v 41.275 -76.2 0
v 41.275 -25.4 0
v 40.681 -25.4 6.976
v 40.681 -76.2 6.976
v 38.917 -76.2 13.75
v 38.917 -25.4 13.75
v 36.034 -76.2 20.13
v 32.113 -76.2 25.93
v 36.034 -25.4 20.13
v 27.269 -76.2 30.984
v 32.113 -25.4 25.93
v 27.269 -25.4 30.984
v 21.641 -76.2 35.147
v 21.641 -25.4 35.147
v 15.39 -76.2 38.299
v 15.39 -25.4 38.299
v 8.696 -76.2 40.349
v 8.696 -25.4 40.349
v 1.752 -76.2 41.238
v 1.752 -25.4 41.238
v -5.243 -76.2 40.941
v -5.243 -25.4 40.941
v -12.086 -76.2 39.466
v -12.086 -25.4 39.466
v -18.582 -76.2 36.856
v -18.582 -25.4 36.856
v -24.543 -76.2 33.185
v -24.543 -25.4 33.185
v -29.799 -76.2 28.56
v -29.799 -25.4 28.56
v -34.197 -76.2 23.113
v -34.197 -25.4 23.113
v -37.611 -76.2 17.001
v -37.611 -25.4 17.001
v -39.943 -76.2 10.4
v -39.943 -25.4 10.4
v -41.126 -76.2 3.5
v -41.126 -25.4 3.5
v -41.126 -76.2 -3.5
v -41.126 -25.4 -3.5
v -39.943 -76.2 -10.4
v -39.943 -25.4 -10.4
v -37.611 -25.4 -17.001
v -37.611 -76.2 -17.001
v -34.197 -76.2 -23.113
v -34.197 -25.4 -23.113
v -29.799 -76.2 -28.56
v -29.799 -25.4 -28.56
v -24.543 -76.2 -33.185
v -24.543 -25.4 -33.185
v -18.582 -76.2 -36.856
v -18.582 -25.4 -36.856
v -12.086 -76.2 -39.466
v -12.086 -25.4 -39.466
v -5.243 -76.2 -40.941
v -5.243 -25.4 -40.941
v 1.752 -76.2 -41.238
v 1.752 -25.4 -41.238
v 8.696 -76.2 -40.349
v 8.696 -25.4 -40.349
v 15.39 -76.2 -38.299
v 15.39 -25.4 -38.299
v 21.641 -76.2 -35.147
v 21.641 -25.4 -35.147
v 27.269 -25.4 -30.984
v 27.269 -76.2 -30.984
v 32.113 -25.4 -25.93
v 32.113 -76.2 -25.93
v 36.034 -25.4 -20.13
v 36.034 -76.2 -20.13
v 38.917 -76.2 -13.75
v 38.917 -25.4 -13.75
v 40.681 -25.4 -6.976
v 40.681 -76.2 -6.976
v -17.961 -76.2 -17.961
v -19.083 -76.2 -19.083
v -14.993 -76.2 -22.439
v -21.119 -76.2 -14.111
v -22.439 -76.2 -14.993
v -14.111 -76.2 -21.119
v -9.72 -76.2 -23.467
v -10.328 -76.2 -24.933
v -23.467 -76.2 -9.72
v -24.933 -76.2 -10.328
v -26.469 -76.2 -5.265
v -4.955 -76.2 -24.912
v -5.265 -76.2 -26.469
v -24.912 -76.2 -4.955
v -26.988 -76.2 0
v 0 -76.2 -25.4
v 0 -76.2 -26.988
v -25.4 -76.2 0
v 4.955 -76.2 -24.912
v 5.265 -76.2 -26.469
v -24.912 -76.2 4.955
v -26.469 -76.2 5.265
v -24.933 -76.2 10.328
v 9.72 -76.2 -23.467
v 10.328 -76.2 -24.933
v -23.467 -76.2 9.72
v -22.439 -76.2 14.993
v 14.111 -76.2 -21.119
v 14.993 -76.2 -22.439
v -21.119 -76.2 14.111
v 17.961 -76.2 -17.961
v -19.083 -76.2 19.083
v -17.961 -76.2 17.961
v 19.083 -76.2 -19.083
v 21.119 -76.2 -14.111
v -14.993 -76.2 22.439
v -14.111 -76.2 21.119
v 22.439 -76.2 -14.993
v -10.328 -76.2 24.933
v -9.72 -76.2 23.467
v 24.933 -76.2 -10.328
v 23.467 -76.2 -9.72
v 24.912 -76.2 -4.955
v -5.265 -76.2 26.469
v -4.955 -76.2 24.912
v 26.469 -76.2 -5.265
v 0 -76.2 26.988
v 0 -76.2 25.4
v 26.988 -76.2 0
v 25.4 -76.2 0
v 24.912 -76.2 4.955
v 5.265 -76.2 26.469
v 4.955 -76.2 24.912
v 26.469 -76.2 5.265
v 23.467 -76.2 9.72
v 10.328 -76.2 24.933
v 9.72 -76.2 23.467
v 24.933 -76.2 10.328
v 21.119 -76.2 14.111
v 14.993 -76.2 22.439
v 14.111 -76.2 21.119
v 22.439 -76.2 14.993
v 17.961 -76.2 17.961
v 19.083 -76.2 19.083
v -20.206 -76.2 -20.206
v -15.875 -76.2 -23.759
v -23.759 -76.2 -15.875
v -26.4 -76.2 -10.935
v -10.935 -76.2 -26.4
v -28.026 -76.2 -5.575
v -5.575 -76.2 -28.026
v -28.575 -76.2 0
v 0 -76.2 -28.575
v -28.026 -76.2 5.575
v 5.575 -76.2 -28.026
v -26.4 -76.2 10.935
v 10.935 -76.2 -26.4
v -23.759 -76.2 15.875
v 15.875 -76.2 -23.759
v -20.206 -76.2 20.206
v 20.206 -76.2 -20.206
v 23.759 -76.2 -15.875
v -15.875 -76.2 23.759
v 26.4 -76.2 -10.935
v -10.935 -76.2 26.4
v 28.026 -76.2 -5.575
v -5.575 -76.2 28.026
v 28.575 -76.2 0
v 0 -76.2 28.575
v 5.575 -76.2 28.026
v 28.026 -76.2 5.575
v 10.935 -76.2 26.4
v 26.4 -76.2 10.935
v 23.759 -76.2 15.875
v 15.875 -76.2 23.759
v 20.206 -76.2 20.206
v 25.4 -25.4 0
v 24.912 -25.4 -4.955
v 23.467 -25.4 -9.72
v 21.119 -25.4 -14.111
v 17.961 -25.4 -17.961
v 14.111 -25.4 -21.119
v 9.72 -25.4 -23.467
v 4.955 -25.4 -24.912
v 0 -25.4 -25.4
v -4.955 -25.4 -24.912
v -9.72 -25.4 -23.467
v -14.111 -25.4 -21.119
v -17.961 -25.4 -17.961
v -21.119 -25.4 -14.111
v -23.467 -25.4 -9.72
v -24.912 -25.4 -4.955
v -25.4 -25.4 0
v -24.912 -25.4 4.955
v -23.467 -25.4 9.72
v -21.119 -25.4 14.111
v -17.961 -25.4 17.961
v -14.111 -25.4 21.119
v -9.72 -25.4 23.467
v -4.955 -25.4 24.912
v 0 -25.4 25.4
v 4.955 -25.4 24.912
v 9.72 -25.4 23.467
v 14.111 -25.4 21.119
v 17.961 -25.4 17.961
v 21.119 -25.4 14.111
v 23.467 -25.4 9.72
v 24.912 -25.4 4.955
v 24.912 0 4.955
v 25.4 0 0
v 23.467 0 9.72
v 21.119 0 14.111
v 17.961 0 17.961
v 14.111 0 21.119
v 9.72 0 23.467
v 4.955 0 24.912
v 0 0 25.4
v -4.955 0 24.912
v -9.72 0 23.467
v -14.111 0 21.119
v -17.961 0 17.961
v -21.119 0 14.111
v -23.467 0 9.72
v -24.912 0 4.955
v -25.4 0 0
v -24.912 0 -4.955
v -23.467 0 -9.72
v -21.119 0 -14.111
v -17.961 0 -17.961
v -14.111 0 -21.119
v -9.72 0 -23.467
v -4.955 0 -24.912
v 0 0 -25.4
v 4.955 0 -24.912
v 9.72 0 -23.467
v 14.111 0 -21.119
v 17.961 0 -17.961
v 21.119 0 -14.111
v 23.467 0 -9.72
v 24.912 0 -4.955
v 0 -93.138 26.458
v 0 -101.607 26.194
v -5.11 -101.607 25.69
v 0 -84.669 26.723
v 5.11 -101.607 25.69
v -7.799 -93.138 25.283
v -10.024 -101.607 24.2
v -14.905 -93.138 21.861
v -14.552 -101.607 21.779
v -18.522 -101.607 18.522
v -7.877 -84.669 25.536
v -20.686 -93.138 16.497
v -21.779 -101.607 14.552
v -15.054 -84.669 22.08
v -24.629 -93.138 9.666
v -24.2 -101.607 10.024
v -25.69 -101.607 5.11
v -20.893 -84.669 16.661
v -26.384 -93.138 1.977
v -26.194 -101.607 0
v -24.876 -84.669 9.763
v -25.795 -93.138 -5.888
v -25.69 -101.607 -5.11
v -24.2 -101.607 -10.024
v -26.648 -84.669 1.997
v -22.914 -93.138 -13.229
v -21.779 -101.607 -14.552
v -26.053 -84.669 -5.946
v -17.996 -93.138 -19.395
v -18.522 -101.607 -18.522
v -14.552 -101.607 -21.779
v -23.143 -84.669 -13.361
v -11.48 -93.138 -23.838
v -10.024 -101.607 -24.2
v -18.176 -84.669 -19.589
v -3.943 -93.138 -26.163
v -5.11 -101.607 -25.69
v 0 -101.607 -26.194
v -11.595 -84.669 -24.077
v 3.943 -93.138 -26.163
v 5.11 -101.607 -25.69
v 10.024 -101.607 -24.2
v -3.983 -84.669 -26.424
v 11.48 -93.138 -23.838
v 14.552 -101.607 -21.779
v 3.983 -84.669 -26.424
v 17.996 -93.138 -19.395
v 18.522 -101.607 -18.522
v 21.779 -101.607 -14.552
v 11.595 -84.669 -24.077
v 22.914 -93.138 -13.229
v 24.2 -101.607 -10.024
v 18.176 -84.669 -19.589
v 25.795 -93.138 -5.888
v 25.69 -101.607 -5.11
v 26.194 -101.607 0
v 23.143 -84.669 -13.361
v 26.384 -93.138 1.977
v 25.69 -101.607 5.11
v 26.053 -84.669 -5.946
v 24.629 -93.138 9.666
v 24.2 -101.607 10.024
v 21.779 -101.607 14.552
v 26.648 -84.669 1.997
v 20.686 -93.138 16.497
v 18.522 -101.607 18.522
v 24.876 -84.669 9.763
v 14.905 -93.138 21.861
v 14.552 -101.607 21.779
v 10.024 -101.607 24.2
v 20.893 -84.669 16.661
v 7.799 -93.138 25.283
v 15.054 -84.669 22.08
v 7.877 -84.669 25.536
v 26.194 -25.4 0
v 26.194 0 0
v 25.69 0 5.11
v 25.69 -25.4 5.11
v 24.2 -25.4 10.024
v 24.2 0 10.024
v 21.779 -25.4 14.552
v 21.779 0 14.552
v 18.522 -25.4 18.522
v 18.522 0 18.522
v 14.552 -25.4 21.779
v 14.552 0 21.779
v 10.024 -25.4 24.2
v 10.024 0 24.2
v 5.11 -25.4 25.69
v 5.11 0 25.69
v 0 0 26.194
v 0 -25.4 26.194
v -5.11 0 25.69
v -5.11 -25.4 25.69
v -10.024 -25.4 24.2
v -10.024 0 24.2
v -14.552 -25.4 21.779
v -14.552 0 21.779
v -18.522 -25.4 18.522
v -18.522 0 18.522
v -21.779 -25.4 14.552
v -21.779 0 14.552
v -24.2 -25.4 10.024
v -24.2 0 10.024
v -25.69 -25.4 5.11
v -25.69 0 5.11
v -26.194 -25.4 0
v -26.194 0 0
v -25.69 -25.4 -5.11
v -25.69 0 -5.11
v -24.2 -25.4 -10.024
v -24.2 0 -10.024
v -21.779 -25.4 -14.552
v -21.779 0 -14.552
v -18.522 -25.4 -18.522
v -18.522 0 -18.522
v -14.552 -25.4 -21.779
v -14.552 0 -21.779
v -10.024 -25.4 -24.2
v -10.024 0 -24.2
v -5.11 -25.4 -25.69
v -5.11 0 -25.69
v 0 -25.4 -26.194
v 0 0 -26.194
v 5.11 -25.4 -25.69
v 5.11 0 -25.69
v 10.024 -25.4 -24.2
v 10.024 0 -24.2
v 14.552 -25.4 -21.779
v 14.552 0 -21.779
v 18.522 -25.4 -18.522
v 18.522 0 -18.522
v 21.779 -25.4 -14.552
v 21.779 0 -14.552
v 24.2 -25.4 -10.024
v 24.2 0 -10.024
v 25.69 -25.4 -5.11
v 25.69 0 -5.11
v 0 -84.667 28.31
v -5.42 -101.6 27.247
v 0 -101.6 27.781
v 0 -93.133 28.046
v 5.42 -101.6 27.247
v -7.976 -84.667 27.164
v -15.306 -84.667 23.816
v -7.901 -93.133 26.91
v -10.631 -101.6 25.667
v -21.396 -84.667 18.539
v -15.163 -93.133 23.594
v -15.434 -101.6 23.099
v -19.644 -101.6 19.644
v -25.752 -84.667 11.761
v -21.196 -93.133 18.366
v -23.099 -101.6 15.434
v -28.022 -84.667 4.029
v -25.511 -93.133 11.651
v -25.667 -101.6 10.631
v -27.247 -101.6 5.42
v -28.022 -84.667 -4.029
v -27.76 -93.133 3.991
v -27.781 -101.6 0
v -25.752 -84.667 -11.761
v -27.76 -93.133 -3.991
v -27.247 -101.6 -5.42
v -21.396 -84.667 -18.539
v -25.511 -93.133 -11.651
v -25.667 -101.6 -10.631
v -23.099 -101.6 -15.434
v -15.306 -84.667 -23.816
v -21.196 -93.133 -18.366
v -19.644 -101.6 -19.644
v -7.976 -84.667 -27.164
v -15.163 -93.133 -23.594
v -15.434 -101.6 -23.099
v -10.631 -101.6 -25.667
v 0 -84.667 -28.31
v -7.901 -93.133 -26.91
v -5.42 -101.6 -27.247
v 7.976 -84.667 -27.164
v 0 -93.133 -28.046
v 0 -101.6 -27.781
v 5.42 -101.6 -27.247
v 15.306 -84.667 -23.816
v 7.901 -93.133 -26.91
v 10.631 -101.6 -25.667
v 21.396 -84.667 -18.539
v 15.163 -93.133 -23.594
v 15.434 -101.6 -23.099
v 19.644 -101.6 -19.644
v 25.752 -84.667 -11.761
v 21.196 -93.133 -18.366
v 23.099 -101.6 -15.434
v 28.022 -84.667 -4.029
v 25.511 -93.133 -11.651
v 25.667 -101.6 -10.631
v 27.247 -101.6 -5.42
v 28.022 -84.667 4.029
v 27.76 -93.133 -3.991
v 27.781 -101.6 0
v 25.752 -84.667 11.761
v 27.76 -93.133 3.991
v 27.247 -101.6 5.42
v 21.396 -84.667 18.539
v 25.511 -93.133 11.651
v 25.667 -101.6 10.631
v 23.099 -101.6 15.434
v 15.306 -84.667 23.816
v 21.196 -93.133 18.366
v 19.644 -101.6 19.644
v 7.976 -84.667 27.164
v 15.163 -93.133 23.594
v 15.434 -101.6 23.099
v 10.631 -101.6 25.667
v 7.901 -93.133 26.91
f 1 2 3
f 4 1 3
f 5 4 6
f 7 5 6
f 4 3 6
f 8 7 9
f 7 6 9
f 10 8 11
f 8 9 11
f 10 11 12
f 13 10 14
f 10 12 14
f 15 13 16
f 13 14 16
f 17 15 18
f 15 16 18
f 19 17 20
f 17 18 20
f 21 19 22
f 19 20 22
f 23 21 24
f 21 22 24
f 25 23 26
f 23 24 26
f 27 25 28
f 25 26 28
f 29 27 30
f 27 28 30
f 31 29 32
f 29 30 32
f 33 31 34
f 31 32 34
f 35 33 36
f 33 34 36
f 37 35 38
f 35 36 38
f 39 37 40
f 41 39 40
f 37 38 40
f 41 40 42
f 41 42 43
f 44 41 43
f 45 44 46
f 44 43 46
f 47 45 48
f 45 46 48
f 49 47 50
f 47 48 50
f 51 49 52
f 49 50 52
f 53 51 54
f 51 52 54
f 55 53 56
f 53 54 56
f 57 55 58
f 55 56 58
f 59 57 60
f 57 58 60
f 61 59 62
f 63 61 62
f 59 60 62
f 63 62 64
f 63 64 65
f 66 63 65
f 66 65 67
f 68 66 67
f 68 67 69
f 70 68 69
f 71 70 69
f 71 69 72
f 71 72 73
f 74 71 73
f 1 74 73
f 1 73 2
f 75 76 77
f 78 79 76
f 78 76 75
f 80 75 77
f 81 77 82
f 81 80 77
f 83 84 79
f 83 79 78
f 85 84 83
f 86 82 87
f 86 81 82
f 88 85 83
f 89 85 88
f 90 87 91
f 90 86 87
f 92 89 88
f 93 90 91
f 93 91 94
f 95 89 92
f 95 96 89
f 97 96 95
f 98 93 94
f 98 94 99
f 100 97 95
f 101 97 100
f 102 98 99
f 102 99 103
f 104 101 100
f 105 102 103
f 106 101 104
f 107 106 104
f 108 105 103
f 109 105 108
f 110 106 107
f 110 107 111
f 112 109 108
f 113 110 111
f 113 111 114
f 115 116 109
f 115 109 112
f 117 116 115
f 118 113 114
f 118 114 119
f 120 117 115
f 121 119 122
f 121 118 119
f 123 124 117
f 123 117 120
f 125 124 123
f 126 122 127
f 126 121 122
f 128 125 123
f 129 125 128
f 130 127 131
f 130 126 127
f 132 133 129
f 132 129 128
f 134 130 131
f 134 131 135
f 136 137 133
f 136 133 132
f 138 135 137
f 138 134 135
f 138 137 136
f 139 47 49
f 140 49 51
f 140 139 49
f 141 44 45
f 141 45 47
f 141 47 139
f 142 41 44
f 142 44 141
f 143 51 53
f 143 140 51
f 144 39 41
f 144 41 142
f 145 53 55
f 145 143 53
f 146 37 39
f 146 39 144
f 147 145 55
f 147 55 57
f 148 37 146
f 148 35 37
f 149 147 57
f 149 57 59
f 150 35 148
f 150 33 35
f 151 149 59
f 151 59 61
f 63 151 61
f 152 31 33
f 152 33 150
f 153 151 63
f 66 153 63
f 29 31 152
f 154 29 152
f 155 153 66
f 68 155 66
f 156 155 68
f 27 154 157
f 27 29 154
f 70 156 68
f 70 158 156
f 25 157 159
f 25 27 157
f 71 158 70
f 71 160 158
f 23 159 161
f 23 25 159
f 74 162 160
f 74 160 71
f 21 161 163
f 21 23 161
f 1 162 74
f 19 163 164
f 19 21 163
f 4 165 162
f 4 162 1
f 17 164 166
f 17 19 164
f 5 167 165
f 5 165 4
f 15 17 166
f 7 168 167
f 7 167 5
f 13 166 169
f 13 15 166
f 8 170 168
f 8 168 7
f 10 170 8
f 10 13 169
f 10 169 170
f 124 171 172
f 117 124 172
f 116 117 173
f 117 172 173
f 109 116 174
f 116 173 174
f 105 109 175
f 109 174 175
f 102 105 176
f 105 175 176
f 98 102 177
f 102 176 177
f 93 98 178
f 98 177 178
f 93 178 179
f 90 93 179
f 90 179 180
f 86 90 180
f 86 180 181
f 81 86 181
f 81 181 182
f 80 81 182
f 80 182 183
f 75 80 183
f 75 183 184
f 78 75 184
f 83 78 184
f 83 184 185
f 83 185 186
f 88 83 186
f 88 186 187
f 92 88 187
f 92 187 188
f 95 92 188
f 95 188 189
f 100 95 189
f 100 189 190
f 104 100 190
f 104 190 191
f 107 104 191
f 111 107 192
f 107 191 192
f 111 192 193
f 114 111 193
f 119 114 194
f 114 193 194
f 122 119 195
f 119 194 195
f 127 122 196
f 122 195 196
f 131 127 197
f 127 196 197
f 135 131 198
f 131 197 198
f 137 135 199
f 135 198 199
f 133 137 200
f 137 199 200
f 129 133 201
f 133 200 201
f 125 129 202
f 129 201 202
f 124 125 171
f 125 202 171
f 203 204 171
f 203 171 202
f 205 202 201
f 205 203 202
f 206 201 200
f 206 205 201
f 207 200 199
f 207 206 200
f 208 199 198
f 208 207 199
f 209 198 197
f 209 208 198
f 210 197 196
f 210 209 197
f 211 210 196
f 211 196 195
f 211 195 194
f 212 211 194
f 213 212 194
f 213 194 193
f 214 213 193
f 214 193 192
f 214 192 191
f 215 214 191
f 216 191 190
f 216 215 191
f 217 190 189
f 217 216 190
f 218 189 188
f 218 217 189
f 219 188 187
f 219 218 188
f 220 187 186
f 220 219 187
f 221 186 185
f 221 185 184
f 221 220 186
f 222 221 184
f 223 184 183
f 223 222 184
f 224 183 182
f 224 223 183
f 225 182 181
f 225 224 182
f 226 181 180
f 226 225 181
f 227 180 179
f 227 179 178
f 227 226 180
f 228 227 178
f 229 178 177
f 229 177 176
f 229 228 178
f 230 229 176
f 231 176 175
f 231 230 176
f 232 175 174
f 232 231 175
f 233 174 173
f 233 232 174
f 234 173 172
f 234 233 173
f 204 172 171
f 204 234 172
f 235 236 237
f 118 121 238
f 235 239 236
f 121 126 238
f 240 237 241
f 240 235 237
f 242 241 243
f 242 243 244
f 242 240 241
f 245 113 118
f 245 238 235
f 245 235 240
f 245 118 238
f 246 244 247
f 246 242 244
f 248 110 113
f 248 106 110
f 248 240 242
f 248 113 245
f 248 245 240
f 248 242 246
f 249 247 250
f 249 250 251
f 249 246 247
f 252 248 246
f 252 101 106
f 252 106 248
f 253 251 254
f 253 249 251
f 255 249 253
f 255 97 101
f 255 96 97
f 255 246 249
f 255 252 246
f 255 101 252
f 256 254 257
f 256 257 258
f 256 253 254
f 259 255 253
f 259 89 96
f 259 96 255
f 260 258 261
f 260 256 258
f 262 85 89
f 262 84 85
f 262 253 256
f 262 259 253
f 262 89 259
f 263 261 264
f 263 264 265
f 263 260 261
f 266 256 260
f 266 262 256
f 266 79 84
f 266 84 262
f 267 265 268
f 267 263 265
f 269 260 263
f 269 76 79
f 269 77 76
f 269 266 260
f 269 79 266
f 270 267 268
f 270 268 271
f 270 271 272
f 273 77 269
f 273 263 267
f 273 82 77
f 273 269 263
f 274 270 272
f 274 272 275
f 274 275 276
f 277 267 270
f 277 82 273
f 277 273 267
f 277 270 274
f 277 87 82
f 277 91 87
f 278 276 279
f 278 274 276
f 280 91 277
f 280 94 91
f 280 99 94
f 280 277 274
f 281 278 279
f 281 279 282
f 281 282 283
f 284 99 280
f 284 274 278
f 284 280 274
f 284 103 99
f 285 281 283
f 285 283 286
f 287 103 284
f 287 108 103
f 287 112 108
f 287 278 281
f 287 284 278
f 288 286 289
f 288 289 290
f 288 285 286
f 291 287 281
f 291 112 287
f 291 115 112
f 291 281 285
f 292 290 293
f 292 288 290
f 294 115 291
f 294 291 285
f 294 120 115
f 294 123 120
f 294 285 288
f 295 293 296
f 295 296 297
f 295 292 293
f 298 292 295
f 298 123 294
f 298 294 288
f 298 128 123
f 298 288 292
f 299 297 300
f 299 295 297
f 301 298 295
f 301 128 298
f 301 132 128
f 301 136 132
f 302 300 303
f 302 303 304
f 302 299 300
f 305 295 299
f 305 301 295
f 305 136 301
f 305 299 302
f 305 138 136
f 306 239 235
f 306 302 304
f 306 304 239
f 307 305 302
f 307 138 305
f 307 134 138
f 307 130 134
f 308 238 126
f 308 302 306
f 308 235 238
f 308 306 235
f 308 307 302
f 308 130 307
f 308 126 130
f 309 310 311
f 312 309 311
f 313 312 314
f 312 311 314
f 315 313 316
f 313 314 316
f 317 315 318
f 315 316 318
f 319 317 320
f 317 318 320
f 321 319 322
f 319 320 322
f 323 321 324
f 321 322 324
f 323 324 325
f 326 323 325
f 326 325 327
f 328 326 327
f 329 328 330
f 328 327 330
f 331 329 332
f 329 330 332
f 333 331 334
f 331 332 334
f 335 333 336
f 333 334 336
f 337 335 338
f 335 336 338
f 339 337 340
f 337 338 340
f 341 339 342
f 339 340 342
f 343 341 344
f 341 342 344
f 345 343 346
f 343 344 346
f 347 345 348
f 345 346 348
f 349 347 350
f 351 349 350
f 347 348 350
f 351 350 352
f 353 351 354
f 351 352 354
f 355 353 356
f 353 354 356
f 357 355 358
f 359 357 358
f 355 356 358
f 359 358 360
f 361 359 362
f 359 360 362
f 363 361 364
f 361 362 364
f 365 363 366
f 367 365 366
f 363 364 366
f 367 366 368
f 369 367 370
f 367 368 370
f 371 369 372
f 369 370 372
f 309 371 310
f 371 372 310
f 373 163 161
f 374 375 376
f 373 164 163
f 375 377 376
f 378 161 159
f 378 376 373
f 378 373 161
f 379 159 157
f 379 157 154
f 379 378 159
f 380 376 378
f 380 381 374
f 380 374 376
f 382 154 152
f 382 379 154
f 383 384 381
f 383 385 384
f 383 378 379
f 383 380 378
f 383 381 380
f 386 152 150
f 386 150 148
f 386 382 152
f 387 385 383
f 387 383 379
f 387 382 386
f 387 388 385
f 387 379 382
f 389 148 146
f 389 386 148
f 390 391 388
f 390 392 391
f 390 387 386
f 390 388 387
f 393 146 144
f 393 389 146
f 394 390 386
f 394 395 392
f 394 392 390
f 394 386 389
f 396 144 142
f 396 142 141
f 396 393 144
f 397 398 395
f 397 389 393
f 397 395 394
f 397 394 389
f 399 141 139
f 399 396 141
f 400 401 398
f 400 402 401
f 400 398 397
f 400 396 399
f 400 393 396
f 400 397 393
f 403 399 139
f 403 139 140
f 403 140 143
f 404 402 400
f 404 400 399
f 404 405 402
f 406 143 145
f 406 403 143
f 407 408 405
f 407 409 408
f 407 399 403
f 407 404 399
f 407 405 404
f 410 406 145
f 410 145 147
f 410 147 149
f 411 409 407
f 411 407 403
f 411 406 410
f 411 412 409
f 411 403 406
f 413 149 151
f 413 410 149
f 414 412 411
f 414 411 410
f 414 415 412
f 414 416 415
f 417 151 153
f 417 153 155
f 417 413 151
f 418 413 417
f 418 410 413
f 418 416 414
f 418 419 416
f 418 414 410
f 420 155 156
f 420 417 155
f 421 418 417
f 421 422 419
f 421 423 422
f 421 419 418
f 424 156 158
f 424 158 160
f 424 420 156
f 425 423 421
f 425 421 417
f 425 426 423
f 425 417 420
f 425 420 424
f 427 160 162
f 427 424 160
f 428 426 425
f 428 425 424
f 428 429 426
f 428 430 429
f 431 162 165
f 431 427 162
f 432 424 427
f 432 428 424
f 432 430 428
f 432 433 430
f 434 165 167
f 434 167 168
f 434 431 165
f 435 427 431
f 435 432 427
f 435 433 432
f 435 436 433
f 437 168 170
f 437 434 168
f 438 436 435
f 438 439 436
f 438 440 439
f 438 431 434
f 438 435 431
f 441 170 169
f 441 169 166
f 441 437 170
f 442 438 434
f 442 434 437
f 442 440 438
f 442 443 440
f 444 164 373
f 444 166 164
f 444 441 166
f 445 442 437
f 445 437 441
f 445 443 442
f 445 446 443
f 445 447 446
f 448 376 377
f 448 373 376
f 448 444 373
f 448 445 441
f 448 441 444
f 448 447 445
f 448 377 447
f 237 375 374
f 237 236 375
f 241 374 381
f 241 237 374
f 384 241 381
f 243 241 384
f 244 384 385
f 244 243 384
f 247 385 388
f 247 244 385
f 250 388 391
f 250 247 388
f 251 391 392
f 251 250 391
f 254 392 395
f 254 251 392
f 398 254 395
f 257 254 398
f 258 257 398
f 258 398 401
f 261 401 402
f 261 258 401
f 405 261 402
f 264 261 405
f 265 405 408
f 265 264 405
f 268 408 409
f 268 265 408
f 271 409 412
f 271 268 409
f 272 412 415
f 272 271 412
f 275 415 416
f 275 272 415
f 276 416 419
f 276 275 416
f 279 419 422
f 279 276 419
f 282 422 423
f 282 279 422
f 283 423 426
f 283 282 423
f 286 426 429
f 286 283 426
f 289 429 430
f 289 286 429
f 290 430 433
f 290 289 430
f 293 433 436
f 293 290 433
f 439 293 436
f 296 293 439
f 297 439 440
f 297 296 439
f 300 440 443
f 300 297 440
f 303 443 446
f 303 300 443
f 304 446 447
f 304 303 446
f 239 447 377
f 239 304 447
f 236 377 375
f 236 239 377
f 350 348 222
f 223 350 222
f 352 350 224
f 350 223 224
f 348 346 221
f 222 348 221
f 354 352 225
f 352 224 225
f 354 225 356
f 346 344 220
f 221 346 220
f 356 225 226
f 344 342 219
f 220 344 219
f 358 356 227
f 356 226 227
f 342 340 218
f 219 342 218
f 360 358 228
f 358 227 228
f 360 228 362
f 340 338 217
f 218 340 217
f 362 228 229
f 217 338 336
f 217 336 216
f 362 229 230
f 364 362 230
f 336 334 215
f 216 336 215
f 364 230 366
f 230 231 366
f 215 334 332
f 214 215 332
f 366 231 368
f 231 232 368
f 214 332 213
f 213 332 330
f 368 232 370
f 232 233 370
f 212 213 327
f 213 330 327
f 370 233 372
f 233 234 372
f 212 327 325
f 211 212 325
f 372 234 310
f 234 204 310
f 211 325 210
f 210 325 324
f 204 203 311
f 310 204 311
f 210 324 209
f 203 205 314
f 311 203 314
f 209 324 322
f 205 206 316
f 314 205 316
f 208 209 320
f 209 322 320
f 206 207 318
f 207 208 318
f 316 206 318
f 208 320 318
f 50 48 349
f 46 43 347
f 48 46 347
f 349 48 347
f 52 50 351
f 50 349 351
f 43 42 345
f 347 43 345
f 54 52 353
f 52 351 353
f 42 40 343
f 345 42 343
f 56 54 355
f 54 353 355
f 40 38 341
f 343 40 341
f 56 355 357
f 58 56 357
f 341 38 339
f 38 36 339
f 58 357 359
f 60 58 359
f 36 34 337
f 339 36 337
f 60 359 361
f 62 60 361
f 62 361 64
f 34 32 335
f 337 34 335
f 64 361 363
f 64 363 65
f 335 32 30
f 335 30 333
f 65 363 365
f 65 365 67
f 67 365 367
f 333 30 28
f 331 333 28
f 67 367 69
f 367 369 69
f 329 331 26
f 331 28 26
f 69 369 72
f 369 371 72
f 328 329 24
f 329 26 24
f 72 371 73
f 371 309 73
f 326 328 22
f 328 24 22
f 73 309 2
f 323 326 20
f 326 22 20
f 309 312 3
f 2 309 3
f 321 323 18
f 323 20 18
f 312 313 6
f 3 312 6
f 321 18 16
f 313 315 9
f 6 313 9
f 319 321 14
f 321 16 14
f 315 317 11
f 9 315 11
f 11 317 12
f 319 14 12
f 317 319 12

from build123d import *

# Parameters (mm, degrees)
F0_R      = 26.19375
F0_R_2    = 25.4
F1_DEPTH  = 25.4
F2_R      = 41.275
F3_DEPTH  = 50.8
F3_FACE_R = 25.4
F6_DEPTH  = 76.2


with BuildPart() as f1:
    # F0 (on Front) → F1 (new body)
    with BuildSketch(Plane.XZ):
        Circle(F0_R)
        Circle(F0_R_2, mode=Mode.SUBTRACT)
    extrude(amount=F1_DEPTH)

    # F2 (on face) → F3 (join)
    with BuildSketch(Plane.XZ.offset(25.4)):
        Circle(F2_R)
    extrude(amount=F3_DEPTH)

    # F4 (on Right) → F5 (revolve)
    with BuildSketch(Plane.YZ):
        Polygon((-76.2, 28.575), (-101.6, 27.78125), (-101.606704, 26.19375), (-76.2, 26.9875), align=None)
    revolve(axis=Axis((0, -38.1, 0), (0, -1, 0)))

    # F3_face (on face) → F6 (cut)
    with BuildSketch(Plane(origin=(0, -25.4, 0), x_dir=(1, 0, 0), z_dir=(0, 1, 0))):
        Circle(F3_FACE_R)
    extrude(amount=-F6_DEPTH, mode=Mode.SUBTRACT)


solid = f1.part
